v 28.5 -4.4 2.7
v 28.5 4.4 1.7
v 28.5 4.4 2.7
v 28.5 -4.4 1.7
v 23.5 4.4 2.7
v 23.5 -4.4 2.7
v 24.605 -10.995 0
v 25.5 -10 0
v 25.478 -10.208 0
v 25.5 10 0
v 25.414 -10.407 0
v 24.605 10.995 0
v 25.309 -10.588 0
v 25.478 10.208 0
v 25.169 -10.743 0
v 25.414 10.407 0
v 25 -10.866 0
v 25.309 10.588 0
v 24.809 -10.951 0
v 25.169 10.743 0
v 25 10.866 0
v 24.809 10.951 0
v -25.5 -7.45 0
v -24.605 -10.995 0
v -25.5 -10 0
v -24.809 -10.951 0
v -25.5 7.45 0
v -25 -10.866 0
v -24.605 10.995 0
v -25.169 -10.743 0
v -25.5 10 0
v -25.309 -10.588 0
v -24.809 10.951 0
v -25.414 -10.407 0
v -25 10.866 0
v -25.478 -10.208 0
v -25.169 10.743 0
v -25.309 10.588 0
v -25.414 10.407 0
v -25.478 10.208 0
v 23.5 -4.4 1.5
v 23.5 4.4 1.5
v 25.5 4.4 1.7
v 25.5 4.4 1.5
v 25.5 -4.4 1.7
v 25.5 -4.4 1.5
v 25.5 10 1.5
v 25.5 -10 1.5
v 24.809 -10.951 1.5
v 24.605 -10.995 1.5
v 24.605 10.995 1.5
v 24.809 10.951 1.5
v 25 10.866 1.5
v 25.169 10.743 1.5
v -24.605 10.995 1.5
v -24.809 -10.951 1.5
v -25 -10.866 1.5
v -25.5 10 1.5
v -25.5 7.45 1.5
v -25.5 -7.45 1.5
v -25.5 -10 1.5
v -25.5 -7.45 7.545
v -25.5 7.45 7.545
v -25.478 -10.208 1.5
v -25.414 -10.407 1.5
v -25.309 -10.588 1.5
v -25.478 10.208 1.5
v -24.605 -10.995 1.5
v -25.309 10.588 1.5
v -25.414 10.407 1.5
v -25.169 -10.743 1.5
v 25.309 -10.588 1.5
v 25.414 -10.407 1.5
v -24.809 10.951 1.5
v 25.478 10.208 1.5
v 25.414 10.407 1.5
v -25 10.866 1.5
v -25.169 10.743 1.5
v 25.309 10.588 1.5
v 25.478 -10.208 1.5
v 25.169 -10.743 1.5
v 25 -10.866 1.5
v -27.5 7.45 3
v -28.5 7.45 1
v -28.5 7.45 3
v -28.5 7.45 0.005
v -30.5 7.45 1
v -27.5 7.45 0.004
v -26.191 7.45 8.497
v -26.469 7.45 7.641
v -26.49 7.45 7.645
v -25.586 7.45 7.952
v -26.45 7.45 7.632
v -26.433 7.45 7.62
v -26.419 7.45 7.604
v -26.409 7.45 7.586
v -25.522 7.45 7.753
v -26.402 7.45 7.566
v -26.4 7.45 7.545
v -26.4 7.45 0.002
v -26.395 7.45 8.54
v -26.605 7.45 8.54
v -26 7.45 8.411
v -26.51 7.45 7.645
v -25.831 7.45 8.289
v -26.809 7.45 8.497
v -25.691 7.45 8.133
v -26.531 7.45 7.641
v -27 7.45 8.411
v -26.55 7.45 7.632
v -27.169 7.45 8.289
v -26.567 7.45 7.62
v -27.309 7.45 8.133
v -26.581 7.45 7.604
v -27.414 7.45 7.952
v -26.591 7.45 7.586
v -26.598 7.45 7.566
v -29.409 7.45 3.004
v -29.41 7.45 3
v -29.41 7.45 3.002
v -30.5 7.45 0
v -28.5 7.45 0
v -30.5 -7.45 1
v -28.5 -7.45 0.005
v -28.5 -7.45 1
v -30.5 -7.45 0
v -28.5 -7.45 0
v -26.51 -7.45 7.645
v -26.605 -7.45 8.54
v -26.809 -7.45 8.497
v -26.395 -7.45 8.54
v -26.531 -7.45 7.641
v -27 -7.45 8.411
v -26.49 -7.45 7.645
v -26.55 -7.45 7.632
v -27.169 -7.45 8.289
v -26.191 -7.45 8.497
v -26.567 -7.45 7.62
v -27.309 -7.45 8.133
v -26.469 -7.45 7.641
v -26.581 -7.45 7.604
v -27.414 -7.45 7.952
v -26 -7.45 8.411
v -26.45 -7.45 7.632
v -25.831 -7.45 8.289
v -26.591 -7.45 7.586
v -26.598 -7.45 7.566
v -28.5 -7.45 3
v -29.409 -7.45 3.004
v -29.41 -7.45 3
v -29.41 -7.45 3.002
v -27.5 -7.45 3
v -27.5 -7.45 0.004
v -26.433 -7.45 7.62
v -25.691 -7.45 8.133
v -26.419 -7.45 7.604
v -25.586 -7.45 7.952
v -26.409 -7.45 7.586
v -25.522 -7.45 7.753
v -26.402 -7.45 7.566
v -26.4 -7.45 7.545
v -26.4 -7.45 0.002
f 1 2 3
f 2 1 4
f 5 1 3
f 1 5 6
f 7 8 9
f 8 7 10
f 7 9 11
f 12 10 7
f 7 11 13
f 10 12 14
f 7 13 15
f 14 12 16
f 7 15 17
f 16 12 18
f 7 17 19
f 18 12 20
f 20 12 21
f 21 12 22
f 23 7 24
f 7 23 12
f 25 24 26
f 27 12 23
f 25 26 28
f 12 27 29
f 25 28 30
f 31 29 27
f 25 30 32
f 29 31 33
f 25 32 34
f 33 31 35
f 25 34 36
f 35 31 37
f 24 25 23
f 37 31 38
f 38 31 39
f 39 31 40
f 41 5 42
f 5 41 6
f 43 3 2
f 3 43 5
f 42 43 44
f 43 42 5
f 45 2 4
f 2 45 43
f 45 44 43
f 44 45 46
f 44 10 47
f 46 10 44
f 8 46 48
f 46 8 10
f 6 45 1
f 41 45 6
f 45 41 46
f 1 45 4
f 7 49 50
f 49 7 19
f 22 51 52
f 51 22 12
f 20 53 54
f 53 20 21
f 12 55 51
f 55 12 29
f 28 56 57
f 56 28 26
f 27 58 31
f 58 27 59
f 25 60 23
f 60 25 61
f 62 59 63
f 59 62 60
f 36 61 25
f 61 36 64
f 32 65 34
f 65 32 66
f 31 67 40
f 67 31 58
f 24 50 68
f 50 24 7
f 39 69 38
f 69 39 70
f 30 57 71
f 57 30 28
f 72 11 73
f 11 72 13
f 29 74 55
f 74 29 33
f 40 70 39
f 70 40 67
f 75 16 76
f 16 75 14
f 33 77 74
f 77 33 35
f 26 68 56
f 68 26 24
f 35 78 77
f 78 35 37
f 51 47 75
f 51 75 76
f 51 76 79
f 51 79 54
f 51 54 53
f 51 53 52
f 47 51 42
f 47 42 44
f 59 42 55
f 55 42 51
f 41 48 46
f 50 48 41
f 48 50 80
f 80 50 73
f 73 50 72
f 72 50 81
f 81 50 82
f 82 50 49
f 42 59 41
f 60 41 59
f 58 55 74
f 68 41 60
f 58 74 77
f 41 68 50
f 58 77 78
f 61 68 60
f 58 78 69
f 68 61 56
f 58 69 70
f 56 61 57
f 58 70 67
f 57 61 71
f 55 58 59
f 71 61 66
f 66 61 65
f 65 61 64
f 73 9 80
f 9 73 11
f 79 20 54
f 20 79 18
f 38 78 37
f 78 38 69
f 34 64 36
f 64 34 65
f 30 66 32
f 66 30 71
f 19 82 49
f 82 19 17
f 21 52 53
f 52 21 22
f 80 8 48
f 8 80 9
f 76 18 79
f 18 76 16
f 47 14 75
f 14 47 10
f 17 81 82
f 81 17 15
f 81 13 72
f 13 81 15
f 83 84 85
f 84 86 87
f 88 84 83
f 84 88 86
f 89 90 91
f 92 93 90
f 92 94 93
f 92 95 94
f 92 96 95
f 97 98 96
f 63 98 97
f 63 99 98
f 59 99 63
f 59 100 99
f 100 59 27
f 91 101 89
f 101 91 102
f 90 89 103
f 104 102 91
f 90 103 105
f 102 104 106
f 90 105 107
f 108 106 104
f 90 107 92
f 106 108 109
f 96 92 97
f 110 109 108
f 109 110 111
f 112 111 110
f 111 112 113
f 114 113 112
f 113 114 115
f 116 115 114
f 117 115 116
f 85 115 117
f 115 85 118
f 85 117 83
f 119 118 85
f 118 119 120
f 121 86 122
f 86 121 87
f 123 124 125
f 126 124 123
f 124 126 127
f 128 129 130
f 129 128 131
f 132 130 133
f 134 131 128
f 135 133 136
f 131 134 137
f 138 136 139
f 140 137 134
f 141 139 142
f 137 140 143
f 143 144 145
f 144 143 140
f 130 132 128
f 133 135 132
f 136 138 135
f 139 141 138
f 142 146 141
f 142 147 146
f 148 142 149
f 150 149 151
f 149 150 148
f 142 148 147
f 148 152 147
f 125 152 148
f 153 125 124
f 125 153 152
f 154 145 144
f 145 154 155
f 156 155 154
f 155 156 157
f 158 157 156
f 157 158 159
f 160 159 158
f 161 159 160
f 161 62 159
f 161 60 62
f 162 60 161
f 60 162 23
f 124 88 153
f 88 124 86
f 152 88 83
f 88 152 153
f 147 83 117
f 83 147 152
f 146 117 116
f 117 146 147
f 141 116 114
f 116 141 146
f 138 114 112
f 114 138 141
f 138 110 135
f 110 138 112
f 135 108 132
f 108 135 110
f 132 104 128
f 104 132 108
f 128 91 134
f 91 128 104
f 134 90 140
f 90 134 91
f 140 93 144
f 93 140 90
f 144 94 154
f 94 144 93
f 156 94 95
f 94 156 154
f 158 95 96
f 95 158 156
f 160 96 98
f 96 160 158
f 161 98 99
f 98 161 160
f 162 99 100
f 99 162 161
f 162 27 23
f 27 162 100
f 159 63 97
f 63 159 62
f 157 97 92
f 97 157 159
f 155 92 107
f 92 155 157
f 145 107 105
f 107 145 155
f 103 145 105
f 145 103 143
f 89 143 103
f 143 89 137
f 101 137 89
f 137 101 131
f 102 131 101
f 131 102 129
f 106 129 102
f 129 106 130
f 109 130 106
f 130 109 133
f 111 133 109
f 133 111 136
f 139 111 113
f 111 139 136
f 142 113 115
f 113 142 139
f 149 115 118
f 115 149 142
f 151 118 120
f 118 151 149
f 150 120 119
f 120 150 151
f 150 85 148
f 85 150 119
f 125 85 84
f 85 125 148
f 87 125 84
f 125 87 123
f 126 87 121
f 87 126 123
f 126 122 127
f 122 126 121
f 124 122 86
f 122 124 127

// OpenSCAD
// This thing generates custom battery covers
//
// v2.0
//
// Licenced under Creative Commons: Attribution, Share-Alike
//		http://creativecommons.org/licenses/by-sa/3.0/
// For attribution you can direct people to the original file on thingiverse:
// 		http://www.thingiverse.com/thing:243269

// ================ variables

//CUSTOMIZER VARIABLES


/* [Basic] */

// how long the battery cover is.  (This dimension is in the clip-to-hooks direction.)
length=51;

// how wide the battery cover is
width=22;

// how thick the battery cover is
thickness=1.5;

// radius for rounding over the corners of the battery cover
corner_radius=1;


/* [Hooks] */

// how wide the hook tabs are
hook_width=4.4;

// how long the hook tabs are
hook_length=3;

// How far the hooks are in/out relative to the edge of the battery cover (often the same as hook_length).
hook_offset=0;

// how far apart the hooks are (on the inside).  (To create one wide hook, just set this to 0.)
hook_spacing=0;

// How thick the case is where the hooks attach, aka, how high the hole in the hook should be.
hook_case_thickness=0.2;

// how thick the back of the hooks are
hook_back_thickness=2;

// how thick the top part of the hooks are
hook_top_thickness=1;


/* [Clip] */

// How wide the clip is
clip_width=14.9;

// How deep the clip is (overhang)
clip_tooth=1;

// How long the clip is
clip_length=3;

// This is used for a side-engagement clip.  Most clips are this way now.  It measures how wide the small part of the clip is.
clip_width_sides=10;

// This is for a front-engagement clip.  If unused, set it to 0, otherwise, how long the catch will be (usually about 2-3mm)
clip_length_catch=1;

// How far the clip is in/out relative to the edge of the battery cover.
clip_offset=3;

// This is how far down into the battery case the clip engages.  Usually it should be the same as "thickness" on the "basic" tab
clip_case_thickness=3;

// The thickness of the finger tab
clip_tab_length=1;

// how thick the clip material is (probably never need to change)
clip_thickness=1;

// spacing between the clip and the body for movement (probably never need to change)
clip_width_margin=1;

// how thick to make the spring part of the clip (probably never need to change)
clip_spring_thickness=0.9;


/* [Support gussets] */

// Which direction the support gussets go
gusset_orientation=0; // [0:clip_lengthwise,1:clip_widthwise]

// How thick the gussets are (set to 0 to turn off gussets)
gusset_thickness=0;

// How high the gussets are
gusset_height=1;

// How far apart the gussets are
gusset_spacing=10;


/* [Advanced] */

// Resolution
$fn=30;


/* [hidden] */

scoche=0.01;
halfscoche=scoche/2;

module clip(clip_width=15,clip_width_sides=10,clip_length=1,clip_case_thickness=5,clip_length_catch=3,clip_tab_length=3,clip_spring_thickness=0.75) {
	slope=0.33; // this is only a ballpark
	top_r=clip_length/3;
	top_r_x=clip_length-top_r;
	top_r_y=clip_length+clip_case_thickness/slope/2;
	overlap_tab_w=2;
	inside_void_d1=top_r*2-clip_spring_thickness*2;
	inside_void_d2=top_r*2-clip_spring_thickness*2;
	inside_void_x=top_r_x;
	clip_tab_thickness=1;
	rotate([90,0,0]) linear_extrude(clip_width) difference () {
		union(){ // the outside shape
			hull () {
				translate([0,clip_tab_thickness]) circle(r=clip_tab_thickness); // outside radius
				translate([clip_length-scoche,0]) square([scoche,clip_tab_thickness]); // inside corner
				translate([top_r_x,top_r_y]) circle(r=top_r); // top
				if(clip_length_catch>0){
					translate([-clip_length_catch+0.1,clip_case_thickness]) circle(r=scoche); // add a front overhang
				}
			}
			translate([-overlap_tab_w,0]) square([overlap_tab_w,clip_tab_thickness]); // the overlap tab
		}
		union(){
			translate([inside_void_x,0]) hull() { // The inside void
				translate([0,top_r_y]) circle(r=inside_void_d1/2);
				translate([-inside_void_d2/2,-clip_tab_length-scoche]) square([inside_void_d2,scoche]);
				// a hollow for being able to push the thing over (especially when opening is less than the hook)
				translate([-clip_tooth,0]) square([clip_tooth,clip_case_thickness]);
			}
			// trim the tab overhang
			translate([-clip_tab_length-clip_tooth,clip_tab_thickness]) square([clip_tooth*2,clip_case_thickness-clip_tab_length]);
		}
	}
}

module hook(size,hook_back_thickness,hook_top_thickness){
	difference(){
		cube(size);
		translate([hook_back_thickness,-size[1]/2,-hook_top_thickness]) cube([size[0],size[1]*2,size[2]]);
	}
}

module hooks(length,hook_length,thickness,hook_spacing,hook_width,hook_case_thickness,hook_back_thickness,hook_top_thickness,hook_offset){
	size=[hook_length+hook_back_thickness,hook_width,hook_case_thickness+hook_top_thickness+thickness];
	                translate([length/2-hook_back_thickness-hook_offset,hook_spacing/2,0]) hook(size,hook_back_thickness,hook_top_thickness);
	mirror([0,1,0]) translate([length/2-hook_back_thickness-hook_offset,hook_spacing/2,0]) hook(size,hook_back_thickness,hook_top_thickness);
}

module flatBase(length,width,corner_radius,thickness,clip_width,clip_length,clip_thickness,clip_width_margin=0.5,clip_offset=0,clip_spring_thickness=0.75){
	clip_hole=[clip_length+scoche-clip_offset-clip_spring_thickness,clip_width+clip_width_margin*2];
	linear_extrude(thickness) difference(){
		// the basic shape
		translate([-length/2,-width/2]) minkowski(){
			translate([corner_radius,corner_radius]) square([length-corner_radius*2,width-corner_radius*2]);
			if(corner_radius>0) circle(r=corner_radius);
		}
		// a hole for the clip
		translate([-length/2-scoche/2,-clip_hole[1]/2]) square(clip_hole); // the hole for the clip
	}	
}

module gussets(width,length,gusset_orientation=0,gusset_thickness=1,gusset_height=3,gusset_spacing=5){
	if(gusset_orientation==0){ // lengthwise
		translate([-length/2,gusset_spacing/2,0]) cube([length,gusset_thickness,gusset_height]);
		mirror([0,1,0])translate([-length/2,gusset_spacing/2,0]) cube([length,gusset_thickness,gusset_height]);
	}else{ // crosswise
		translate([gusset_spacing/2,-width/2,0]) cube([gusset_thickness,width,gusset_height]);
		mirror([1,0,0])translate([gusset_spacing/2,-width/2,0]) cube([gusset_thickness,width,gusset_height]);
	}
}

module cover(width=30,length=60,thickness=0.5,hook_case_thickness=3.9,
	gusset_orientation=0,gusset_thickness=1,gusset_height=3,gusset_spacing=5,
	corner_radius=1,hook_width=7.5,hook_spacing=29,clip_width=15,clip_width_sides=10,
	clip_length=1,clip_length_catch=3,clip_case_thickness=5,hook_length=5.8,clip_tab_length=3,
	clip_width_margin=0.5,clip_offset=0,hook_back_thickness=0.5,hook_top_thickness=0.5,clip_spring_thickness=0.75,
	hook_offset=0)
{
	gussetInset=max(hook_length,clip_length-clip_offset); // need to make sure it's short enough not to interfere with other parts
	flatBase(length,width,corner_radius,thickness,clip_width,clip_length,clip_thickness,clip_width_margin,clip_offset,clip_spring_thickness);
	hooks(length,hook_length,thickness,hook_spacing,hook_width,hook_case_thickness,hook_back_thickness,hook_top_thickness,hook_offset);
	gussets(width,length-gussetInset*2,gusset_orientation,gusset_thickness,gusset_height+thickness,gusset_spacing);
	translate([-length/2-clip_offset,clip_width/2,0]) clip(clip_width,clip_width_sides,clip_length,clip_case_thickness,clip_length_catch,clip_tab_length,clip_spring_thickness);
}


cover(width,length,thickness,hook_case_thickness,
	gusset_orientation,gusset_thickness,gusset_height,gusset_spacing,
	corner_radius,hook_width,hook_spacing,clip_width,clip_width_sides,
	clip_length,clip_length_catch,clip_case_thickness,hook_length,clip_tab_length,
	clip_width_margin,clip_offset,hook_back_thickness,hook_top_thickness,clip_spring_thickness,
	hook_offset);
